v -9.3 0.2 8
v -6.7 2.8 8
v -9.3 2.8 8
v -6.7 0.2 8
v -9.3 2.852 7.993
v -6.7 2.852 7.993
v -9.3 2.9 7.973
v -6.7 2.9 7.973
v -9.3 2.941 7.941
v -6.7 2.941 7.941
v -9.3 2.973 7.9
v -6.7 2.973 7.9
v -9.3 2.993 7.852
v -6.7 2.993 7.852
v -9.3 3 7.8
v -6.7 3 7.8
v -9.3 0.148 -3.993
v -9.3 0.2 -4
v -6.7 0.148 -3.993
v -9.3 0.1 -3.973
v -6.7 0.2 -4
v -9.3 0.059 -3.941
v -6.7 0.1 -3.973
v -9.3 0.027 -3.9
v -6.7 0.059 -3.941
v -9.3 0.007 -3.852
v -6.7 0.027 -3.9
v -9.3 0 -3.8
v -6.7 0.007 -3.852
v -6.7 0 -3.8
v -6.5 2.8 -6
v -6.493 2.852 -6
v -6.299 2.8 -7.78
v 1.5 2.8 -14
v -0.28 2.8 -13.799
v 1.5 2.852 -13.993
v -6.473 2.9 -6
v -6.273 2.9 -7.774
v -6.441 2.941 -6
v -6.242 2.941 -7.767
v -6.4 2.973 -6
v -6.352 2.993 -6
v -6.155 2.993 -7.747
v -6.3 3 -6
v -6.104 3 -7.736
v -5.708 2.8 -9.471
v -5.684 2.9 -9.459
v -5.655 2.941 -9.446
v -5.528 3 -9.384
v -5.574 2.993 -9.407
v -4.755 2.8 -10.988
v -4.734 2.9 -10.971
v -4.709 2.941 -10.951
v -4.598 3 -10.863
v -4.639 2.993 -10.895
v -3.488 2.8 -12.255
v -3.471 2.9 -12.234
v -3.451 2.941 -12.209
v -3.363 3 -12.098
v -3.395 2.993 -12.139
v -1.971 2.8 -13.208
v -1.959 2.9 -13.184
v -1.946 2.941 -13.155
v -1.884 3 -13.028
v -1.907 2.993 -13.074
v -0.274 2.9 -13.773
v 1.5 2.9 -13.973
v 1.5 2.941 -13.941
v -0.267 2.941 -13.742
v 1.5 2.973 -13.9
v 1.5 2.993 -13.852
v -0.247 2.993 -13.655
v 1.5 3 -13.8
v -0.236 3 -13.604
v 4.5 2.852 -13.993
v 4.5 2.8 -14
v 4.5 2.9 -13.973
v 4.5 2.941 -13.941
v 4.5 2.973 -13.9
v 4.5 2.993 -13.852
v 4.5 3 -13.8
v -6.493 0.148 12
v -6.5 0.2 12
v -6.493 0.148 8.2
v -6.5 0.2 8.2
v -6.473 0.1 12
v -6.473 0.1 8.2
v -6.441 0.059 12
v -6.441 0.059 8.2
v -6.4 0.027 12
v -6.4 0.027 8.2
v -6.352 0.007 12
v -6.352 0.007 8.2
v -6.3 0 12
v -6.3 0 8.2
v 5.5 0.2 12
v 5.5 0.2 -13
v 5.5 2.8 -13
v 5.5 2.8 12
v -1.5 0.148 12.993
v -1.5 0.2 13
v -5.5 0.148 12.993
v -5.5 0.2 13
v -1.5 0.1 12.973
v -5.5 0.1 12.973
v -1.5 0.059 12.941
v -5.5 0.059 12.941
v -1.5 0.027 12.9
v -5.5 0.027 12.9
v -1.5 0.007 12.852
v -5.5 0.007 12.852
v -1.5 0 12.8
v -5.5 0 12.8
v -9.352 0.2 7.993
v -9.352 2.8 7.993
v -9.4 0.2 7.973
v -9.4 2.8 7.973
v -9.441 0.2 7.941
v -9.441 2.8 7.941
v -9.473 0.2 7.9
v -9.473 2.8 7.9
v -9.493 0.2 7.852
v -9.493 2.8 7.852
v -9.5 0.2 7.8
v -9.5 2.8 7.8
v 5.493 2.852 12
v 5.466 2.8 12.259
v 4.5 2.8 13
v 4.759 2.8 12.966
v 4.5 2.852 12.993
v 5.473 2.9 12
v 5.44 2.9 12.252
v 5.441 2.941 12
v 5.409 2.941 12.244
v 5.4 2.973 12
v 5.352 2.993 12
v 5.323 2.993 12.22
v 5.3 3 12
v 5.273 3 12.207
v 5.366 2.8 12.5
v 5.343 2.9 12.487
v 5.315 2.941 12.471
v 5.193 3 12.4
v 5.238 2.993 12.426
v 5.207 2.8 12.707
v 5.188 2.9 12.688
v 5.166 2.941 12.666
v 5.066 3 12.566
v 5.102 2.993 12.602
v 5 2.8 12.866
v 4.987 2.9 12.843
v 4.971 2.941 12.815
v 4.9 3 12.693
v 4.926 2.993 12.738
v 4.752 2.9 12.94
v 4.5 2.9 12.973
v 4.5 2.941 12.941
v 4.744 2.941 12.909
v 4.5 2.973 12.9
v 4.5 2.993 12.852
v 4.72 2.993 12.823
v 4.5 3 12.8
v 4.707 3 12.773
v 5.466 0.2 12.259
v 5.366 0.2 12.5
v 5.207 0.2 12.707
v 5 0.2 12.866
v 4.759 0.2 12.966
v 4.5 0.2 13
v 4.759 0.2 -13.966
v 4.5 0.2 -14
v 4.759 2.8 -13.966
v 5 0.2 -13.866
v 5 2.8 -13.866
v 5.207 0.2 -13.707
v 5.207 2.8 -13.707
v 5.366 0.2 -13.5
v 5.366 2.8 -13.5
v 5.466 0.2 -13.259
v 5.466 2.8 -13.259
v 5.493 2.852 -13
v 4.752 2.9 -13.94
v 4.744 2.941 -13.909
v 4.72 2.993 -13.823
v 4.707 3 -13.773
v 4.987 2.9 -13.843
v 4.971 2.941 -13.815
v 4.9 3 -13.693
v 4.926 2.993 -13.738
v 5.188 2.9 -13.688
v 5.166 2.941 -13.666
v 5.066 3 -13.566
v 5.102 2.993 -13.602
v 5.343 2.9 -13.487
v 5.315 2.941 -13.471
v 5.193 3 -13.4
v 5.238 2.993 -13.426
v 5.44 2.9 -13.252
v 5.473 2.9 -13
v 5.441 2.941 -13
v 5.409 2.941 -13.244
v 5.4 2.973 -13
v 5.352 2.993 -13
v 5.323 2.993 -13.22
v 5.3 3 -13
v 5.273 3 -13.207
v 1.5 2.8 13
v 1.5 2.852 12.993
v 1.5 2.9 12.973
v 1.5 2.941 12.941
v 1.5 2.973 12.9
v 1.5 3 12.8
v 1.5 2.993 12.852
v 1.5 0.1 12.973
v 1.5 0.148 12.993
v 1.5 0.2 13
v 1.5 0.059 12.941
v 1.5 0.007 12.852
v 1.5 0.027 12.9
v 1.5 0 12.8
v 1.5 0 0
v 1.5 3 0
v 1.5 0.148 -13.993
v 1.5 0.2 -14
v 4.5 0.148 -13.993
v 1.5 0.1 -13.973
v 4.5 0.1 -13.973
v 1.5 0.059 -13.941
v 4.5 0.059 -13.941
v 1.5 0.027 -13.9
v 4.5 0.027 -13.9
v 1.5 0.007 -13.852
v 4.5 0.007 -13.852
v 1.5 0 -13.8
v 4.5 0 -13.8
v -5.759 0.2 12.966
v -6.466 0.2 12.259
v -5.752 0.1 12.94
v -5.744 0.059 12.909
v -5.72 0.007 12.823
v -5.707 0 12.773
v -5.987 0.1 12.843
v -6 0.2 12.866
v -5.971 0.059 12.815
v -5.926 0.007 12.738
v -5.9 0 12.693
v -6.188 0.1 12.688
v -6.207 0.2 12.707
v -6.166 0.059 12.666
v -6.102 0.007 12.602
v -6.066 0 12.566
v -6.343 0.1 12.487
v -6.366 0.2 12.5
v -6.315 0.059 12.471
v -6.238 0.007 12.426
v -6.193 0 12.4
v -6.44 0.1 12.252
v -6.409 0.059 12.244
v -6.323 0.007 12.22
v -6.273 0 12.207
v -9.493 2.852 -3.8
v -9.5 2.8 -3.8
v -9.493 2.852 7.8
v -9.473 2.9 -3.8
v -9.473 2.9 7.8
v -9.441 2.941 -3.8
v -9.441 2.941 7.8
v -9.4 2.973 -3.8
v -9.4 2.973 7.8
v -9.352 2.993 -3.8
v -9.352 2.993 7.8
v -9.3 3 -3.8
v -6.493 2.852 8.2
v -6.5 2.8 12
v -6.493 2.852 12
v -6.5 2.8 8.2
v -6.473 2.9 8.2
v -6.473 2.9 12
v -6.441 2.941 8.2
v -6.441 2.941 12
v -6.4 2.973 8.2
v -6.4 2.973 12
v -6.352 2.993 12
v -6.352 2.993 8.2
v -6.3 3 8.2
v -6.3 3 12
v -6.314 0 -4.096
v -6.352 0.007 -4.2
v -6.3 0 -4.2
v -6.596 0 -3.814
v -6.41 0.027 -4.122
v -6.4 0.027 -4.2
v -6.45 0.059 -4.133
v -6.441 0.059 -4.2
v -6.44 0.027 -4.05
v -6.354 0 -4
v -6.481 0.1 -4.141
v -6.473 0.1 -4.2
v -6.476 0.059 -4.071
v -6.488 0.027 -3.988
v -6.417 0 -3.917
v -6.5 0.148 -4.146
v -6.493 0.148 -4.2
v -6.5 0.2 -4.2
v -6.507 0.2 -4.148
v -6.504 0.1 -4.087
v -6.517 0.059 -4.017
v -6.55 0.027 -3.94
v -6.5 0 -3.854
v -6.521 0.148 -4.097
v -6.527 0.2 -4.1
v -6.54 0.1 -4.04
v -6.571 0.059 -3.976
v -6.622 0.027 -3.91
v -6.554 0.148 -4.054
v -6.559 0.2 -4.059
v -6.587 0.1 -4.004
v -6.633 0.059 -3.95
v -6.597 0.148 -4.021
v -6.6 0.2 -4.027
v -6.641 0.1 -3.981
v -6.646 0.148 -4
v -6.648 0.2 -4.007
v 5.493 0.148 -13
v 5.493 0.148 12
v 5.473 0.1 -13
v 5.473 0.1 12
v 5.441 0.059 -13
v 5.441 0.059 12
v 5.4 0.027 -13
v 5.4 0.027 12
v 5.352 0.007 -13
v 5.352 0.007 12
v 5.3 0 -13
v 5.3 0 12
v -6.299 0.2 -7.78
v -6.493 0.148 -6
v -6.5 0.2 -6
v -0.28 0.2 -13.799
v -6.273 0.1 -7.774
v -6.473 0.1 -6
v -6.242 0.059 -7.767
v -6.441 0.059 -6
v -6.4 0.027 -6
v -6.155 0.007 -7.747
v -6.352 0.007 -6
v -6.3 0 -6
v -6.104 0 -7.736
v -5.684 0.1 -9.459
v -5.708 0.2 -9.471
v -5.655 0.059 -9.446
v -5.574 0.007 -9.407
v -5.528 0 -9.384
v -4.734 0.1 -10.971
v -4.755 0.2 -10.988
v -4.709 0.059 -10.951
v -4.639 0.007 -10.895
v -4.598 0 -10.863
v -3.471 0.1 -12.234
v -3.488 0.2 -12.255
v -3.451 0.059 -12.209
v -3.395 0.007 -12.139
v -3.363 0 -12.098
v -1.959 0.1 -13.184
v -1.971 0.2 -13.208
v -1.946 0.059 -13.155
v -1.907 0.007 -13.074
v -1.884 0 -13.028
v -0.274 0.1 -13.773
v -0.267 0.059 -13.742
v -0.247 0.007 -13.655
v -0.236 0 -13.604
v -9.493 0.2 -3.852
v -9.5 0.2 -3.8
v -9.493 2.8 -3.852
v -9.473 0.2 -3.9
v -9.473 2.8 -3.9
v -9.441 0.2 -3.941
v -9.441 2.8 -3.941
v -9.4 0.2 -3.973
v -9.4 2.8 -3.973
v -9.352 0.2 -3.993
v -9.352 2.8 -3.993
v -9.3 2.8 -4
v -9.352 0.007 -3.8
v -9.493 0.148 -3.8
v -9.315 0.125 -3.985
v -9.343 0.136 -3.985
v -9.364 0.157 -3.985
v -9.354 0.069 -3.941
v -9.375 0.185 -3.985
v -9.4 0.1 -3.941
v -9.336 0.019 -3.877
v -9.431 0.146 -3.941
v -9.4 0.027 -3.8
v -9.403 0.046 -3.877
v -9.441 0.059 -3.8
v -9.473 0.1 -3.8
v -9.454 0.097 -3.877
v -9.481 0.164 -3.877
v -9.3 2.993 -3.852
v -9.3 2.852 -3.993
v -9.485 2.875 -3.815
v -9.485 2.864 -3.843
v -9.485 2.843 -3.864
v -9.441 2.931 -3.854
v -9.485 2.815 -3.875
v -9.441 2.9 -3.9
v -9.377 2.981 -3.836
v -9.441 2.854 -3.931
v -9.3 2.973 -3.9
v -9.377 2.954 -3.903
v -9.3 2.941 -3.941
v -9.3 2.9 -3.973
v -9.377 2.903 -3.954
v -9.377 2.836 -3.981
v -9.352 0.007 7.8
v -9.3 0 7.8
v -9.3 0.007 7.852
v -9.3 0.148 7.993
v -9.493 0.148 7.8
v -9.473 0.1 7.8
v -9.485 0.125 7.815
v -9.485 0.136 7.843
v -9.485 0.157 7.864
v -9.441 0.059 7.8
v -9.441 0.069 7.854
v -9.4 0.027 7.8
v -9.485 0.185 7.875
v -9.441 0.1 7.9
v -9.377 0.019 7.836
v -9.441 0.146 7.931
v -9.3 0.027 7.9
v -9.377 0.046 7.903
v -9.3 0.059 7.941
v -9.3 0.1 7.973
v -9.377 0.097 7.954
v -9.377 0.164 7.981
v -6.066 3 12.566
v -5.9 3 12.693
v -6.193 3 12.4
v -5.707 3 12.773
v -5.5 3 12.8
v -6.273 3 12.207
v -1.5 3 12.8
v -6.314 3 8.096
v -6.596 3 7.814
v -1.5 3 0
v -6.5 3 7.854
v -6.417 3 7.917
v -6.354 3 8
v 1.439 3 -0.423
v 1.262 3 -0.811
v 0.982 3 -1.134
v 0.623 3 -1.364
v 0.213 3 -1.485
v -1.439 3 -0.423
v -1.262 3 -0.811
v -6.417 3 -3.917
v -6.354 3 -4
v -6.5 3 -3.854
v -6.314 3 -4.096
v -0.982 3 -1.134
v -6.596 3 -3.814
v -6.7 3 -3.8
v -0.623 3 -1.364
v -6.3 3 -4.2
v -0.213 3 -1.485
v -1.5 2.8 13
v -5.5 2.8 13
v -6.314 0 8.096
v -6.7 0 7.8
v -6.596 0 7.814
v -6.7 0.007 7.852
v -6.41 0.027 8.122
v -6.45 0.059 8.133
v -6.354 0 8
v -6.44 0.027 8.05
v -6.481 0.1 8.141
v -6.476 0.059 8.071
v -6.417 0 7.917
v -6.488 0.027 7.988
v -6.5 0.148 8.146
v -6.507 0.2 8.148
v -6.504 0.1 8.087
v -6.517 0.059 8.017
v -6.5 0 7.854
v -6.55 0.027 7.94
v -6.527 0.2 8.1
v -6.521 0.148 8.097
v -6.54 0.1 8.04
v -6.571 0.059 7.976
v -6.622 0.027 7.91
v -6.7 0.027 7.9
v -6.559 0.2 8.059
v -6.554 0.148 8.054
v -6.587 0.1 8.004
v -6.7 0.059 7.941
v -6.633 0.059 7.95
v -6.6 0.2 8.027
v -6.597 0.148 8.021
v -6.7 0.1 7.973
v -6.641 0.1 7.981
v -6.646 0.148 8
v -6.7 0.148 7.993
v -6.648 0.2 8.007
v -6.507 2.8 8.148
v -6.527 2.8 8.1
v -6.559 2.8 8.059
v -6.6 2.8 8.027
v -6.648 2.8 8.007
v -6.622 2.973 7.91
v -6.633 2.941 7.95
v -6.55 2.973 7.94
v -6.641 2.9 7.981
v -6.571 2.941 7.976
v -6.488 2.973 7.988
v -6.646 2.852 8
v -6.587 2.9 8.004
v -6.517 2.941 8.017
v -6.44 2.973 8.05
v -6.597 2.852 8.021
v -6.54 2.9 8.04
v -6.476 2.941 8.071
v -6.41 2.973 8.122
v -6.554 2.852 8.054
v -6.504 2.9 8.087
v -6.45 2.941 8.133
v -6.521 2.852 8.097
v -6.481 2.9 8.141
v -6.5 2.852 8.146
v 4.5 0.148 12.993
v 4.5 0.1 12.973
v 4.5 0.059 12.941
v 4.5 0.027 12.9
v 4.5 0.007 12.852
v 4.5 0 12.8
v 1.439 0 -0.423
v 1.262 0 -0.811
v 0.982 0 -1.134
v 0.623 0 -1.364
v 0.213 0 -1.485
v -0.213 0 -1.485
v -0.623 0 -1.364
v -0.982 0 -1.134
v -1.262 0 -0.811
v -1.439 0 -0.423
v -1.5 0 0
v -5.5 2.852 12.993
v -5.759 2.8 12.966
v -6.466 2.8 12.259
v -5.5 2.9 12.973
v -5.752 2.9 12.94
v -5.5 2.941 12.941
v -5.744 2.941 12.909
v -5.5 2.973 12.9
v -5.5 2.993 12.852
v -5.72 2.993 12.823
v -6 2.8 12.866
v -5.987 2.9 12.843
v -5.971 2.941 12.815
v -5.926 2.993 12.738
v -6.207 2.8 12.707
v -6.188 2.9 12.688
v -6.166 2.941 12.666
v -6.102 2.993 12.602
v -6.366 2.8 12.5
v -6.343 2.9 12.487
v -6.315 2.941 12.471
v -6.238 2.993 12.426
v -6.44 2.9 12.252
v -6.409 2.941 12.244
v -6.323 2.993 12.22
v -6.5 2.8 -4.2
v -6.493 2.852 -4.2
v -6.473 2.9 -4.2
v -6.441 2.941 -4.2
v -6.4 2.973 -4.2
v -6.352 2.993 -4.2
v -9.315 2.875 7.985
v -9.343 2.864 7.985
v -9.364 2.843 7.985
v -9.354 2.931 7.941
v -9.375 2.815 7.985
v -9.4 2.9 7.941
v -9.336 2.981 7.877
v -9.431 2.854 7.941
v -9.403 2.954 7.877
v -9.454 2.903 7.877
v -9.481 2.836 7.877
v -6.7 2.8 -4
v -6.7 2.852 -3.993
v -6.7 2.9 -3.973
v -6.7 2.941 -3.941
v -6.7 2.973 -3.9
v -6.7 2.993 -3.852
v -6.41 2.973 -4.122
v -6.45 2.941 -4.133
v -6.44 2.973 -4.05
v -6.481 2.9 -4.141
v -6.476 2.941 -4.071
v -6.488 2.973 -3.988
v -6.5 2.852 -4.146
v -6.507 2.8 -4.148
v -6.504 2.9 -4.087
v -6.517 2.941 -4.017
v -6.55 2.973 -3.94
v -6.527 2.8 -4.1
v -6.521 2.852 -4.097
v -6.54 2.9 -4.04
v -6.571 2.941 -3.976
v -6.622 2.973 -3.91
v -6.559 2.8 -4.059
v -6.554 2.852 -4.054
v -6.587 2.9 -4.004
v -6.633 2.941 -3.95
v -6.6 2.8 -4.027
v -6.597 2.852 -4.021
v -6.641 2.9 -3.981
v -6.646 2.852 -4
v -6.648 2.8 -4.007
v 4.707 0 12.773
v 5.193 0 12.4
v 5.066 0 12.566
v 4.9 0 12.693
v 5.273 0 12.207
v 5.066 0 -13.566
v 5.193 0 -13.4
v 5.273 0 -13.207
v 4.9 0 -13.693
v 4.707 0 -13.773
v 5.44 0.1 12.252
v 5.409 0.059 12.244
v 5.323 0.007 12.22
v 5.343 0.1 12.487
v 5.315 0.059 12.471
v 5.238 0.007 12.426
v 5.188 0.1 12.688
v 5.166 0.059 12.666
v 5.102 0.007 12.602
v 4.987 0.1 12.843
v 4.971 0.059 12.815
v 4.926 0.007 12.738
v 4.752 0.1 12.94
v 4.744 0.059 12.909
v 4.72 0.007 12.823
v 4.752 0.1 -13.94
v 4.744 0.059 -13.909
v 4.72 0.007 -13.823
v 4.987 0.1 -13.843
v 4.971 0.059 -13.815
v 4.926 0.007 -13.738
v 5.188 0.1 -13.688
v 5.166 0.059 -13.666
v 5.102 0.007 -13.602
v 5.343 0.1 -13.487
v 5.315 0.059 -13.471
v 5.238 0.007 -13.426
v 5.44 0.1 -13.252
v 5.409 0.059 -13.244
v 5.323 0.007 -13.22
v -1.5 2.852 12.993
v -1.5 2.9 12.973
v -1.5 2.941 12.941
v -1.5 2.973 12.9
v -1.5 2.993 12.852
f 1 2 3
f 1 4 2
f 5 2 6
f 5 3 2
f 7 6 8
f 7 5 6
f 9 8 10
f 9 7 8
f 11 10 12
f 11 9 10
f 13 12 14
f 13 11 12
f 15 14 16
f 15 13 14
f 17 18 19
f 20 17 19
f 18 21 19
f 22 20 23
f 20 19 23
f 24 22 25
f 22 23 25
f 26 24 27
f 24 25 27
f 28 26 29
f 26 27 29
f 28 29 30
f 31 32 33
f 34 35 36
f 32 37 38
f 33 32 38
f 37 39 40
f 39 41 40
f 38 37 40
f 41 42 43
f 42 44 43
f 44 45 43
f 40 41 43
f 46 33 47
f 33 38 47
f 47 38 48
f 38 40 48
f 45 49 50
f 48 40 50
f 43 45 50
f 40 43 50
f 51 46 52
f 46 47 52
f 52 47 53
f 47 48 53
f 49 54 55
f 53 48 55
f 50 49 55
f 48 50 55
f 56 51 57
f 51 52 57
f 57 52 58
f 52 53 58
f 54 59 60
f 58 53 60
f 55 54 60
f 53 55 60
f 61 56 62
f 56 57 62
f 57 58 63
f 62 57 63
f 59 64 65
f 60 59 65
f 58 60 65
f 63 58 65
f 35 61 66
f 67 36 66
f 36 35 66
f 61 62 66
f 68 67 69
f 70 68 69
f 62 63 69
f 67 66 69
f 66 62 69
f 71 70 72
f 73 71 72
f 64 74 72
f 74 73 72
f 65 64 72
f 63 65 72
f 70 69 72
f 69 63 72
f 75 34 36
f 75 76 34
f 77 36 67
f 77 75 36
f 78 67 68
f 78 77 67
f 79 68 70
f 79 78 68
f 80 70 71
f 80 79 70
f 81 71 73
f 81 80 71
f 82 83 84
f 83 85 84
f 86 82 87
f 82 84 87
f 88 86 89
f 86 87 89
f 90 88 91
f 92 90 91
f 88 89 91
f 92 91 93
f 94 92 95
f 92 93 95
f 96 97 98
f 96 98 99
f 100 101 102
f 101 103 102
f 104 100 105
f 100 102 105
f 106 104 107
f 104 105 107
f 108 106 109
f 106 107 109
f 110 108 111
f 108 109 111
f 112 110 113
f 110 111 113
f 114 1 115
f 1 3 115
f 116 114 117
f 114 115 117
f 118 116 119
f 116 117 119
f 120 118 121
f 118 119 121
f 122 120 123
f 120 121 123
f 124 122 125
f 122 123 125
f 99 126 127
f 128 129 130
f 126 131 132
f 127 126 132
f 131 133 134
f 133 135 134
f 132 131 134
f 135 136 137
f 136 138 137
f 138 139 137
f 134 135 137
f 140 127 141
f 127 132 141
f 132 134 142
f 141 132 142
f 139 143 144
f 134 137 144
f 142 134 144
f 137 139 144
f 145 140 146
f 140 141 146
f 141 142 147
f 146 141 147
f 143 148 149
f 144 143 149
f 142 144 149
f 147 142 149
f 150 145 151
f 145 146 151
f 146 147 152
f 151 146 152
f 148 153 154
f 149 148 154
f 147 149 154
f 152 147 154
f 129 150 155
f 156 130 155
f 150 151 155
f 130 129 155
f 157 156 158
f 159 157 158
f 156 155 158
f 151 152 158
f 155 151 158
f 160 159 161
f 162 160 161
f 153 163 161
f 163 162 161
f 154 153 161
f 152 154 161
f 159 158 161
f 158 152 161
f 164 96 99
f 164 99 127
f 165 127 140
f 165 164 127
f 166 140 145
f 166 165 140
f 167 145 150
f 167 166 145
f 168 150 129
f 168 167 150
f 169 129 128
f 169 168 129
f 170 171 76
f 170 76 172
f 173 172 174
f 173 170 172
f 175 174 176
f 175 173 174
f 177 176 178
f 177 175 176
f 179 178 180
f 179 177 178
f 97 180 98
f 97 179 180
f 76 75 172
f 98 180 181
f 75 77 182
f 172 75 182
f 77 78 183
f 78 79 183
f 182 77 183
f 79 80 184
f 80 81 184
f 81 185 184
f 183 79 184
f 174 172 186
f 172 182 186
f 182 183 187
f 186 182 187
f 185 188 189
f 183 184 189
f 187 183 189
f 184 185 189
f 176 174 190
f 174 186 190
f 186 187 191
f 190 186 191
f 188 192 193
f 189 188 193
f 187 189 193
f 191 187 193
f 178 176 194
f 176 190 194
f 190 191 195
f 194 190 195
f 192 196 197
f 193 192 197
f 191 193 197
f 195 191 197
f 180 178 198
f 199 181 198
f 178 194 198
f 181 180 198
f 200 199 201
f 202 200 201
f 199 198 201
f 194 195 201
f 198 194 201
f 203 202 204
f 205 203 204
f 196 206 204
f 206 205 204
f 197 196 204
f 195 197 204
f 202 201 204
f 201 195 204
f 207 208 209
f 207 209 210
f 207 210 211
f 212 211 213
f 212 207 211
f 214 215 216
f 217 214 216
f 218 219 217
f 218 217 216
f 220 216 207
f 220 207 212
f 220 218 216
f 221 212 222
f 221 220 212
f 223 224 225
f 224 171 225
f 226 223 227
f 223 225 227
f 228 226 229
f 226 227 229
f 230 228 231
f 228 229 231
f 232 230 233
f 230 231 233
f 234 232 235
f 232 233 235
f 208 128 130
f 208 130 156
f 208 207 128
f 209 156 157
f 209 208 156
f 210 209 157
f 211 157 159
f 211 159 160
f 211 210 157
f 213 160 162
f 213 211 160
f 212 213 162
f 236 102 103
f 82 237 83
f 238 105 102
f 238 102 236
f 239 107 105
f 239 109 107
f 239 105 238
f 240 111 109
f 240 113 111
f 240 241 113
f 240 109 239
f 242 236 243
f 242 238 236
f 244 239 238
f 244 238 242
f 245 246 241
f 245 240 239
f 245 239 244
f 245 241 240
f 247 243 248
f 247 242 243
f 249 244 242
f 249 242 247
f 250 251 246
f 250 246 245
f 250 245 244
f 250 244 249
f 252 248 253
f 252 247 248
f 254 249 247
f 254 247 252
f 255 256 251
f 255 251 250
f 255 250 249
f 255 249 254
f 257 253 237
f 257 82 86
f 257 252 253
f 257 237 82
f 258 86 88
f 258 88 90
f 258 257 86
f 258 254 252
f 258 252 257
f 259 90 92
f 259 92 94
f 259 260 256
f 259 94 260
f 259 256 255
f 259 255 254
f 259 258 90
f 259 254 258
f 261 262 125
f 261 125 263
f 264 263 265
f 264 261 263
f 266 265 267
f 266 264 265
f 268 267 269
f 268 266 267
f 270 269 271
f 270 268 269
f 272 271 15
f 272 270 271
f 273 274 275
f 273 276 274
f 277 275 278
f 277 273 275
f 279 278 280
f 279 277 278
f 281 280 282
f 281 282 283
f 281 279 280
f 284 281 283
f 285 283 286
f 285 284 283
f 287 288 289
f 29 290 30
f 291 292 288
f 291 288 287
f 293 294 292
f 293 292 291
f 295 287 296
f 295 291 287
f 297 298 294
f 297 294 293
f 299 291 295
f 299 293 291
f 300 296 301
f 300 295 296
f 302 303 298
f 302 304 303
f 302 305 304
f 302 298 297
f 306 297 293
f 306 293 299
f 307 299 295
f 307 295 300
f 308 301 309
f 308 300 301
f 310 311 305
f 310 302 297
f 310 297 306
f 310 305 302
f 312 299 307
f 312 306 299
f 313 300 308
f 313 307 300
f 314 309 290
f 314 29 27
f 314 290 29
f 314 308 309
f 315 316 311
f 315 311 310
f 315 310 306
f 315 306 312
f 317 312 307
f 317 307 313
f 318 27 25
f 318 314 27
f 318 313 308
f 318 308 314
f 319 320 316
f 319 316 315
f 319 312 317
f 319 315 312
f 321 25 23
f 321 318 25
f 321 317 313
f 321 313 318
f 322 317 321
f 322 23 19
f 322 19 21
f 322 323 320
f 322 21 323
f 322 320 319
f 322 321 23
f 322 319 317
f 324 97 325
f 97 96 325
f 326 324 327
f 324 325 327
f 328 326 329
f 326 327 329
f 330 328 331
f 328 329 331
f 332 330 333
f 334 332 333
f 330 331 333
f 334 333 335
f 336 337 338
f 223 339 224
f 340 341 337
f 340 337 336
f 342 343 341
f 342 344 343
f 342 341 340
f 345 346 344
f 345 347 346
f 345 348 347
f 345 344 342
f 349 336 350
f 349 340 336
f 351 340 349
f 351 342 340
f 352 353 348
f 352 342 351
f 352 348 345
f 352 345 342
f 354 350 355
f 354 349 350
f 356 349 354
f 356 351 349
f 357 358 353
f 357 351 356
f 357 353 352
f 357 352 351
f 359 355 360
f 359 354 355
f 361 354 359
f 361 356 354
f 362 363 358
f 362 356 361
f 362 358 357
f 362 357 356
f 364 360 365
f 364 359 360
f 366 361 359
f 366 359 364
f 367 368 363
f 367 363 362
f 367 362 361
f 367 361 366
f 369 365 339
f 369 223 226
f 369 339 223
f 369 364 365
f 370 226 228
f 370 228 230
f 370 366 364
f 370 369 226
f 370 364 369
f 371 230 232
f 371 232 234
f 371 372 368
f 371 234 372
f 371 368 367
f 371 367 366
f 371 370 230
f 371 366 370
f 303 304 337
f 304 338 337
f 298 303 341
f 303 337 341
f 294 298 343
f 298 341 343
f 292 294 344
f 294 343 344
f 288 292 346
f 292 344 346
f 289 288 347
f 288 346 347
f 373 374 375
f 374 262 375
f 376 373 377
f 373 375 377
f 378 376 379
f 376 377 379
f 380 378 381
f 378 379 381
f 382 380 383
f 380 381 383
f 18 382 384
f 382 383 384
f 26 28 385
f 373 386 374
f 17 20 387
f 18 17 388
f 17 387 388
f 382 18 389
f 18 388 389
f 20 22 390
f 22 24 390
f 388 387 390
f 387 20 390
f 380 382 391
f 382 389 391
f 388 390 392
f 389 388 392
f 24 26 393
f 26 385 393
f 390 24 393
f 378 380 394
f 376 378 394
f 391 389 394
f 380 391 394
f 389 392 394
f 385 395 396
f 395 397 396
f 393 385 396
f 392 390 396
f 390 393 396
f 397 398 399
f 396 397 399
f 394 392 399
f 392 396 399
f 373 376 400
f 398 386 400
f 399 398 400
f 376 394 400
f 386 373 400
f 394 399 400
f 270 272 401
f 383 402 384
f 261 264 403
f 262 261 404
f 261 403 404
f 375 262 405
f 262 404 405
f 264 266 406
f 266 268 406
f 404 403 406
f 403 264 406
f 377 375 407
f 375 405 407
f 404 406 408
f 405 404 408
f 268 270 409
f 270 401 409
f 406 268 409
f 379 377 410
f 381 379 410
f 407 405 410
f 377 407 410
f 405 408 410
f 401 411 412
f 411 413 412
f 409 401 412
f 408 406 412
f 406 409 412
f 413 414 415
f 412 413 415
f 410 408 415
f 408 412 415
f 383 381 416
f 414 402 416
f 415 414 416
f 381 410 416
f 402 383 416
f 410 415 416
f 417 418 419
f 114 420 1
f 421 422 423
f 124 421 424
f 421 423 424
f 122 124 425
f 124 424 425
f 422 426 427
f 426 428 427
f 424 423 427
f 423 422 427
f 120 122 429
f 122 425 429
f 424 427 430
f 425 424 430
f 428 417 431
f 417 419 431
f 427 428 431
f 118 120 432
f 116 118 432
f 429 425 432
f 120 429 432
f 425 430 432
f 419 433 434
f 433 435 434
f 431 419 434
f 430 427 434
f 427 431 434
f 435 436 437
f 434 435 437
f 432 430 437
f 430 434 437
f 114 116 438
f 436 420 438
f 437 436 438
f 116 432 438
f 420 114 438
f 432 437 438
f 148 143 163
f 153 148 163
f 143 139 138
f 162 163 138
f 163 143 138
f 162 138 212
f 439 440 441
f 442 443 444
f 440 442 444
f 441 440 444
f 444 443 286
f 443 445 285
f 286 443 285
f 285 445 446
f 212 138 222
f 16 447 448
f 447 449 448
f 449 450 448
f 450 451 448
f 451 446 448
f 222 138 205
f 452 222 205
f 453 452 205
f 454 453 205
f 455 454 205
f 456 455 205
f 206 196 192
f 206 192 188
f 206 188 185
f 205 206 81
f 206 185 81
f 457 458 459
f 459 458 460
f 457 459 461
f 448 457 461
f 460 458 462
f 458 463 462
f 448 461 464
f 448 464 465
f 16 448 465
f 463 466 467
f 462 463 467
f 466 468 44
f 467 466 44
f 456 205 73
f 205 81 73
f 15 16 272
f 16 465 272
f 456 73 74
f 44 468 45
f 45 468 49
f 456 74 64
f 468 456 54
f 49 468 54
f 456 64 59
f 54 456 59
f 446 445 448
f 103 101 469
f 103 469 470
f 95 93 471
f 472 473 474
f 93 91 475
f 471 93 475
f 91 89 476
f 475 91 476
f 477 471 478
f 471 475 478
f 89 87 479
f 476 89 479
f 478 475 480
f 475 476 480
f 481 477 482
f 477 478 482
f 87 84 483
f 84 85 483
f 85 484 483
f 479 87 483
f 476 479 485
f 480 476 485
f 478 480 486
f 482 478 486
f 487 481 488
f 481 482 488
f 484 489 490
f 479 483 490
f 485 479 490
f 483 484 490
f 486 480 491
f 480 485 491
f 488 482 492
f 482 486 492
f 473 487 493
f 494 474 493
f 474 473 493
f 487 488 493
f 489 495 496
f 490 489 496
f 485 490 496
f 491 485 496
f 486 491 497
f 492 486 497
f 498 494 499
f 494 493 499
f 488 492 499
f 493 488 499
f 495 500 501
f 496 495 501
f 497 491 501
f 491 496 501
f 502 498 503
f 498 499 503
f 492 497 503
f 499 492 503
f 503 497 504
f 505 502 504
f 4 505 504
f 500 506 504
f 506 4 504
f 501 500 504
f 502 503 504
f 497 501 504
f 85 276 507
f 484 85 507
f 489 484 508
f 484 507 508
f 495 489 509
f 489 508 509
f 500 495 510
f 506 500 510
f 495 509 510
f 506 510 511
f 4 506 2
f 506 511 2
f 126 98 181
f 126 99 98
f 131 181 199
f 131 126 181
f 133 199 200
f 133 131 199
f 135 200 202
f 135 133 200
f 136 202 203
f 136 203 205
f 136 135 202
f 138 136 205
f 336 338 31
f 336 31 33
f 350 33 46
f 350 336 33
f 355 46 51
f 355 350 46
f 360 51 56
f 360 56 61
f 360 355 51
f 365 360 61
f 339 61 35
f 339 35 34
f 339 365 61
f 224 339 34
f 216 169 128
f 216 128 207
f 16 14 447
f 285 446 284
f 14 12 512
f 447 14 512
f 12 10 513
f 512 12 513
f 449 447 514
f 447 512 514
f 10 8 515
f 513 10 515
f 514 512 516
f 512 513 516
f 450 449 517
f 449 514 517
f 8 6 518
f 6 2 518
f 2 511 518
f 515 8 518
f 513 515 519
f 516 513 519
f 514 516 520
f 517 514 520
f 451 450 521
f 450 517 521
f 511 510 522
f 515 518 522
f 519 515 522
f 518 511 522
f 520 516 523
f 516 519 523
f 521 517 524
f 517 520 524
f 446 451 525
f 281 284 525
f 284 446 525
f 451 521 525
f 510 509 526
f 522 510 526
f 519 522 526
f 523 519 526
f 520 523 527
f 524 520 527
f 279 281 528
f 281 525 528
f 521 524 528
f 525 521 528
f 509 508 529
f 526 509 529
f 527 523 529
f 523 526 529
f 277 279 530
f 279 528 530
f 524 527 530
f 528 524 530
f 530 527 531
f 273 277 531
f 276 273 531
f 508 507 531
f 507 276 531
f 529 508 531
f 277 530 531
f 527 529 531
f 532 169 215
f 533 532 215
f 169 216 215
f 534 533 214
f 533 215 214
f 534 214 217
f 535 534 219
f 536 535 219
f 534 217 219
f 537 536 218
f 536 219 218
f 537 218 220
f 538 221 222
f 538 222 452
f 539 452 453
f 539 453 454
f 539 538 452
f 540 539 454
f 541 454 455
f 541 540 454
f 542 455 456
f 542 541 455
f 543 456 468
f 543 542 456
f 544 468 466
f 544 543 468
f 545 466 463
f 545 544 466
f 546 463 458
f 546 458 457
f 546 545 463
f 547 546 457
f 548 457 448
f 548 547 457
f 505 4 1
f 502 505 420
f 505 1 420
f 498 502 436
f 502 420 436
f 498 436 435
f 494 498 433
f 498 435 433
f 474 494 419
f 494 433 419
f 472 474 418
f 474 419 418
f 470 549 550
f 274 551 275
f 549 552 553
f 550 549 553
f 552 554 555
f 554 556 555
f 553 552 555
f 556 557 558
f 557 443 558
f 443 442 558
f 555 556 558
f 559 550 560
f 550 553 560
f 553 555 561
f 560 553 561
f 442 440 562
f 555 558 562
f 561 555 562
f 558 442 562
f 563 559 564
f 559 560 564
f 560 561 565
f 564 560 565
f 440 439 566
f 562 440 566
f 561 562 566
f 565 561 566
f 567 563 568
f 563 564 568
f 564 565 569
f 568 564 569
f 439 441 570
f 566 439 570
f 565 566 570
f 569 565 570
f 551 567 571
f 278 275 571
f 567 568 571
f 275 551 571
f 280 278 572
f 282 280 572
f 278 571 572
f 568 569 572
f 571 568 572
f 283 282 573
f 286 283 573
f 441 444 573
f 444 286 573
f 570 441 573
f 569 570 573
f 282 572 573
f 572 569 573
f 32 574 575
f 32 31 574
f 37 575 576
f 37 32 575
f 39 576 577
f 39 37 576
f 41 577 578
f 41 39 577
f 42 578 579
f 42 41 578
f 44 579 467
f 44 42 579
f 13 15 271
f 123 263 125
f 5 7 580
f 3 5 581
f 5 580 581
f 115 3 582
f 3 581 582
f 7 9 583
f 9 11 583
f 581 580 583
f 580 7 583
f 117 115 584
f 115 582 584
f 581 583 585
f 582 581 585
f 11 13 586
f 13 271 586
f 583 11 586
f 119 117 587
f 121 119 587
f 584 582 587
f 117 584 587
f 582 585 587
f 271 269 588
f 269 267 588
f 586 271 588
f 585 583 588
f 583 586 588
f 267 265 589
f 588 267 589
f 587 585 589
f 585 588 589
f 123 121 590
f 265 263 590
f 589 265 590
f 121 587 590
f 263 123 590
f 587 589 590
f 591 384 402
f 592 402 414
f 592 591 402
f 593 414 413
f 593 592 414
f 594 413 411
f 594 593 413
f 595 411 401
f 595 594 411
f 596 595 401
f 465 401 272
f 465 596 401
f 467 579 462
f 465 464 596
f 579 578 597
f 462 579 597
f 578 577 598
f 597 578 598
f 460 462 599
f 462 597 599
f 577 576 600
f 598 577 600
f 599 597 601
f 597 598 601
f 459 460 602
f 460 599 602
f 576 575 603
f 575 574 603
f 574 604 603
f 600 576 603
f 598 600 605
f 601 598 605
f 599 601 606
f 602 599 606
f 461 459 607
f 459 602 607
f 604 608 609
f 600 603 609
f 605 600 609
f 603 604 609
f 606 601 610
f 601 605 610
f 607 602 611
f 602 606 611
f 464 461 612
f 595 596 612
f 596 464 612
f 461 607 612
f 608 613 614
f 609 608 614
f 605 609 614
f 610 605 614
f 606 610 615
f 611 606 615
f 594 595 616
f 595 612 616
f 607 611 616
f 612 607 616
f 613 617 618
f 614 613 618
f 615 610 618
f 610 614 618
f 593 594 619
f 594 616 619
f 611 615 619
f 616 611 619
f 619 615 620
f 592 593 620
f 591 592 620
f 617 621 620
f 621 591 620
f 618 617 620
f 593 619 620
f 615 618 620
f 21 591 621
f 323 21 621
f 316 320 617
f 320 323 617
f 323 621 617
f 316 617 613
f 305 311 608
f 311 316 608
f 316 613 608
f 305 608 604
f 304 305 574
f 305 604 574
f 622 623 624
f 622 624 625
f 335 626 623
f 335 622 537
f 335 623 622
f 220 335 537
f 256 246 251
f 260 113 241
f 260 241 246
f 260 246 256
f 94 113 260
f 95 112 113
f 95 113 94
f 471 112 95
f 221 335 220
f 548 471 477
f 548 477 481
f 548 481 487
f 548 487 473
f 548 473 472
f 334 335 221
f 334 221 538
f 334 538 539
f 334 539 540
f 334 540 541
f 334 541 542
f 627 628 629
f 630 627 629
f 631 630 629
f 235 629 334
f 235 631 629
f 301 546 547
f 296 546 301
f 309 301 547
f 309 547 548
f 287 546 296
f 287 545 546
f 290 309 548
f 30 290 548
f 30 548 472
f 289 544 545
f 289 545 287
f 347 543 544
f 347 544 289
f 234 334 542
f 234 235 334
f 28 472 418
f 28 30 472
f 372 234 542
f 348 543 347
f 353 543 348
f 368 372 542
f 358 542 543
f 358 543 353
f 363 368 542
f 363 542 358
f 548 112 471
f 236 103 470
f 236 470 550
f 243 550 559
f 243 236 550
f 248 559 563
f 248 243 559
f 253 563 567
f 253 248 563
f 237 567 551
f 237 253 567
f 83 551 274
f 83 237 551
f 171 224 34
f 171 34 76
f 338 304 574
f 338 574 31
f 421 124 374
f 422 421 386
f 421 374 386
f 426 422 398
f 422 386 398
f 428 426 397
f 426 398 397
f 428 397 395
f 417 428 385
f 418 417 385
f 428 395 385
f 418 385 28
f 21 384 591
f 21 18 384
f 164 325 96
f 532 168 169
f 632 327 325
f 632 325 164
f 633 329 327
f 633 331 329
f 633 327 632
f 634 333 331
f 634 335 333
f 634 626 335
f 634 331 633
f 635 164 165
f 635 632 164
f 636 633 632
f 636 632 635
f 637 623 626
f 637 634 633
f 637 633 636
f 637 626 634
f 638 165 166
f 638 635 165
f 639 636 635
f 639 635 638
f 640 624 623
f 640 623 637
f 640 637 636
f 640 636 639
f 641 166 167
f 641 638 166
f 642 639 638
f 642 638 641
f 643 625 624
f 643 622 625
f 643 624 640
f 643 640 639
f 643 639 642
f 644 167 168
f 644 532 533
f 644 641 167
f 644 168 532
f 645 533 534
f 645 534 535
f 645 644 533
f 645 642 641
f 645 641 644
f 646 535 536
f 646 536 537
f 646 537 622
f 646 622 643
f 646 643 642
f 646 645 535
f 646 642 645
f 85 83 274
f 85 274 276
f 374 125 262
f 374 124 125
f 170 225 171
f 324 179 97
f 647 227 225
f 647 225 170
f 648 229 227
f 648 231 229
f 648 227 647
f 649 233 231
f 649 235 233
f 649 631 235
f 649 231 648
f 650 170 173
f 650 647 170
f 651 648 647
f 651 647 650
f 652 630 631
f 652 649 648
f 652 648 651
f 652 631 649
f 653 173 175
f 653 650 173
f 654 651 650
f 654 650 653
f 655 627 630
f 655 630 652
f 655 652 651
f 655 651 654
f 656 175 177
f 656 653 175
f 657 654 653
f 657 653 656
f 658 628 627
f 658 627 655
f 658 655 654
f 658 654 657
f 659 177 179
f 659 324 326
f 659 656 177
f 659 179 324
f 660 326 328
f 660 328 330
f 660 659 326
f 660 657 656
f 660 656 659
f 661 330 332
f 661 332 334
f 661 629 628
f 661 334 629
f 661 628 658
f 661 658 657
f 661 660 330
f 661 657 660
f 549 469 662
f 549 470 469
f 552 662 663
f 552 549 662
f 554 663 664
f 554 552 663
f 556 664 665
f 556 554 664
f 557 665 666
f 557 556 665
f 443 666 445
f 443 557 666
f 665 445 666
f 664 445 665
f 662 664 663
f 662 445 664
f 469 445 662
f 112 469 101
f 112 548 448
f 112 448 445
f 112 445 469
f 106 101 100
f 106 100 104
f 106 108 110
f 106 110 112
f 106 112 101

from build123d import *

# Parameters (mm, degrees)
BOSS_EXTRUDE1_DEPTH = 3
FILLET1_R           = 0.2


with BuildPart() as part:
    # Sketch1 → Boss-Extrude1 (new body)
    with BuildSketch(Plane(origin=(0, 0, 0), x_dir=(1, 0, 0), z_dir=(0, 1, 0))):
        with BuildLine():
            Line((-1.5, 0), (-1.5, -13))
            Line((-1.5, -13), (-5.5, -13))
            ThreePointArc((-5.5, -13), (-6.207106781, -12.707106781), (-6.5, -12))
            Line((-6.5, -12), (-6.5, -8))
            Line((-6.5, -8), (-9.5, -8))
            Line((-9.5, -8), (-9.5, 4))
            Line((-9.5, 4), (-6.5, 4))
            Line((-6.5, 4), (-6.5, 6))
            ThreePointArc((-6.5, 6), (-4.156854249, 11.656854249), (1.5, 14))
            Line((1.5, 14), (4.5, 14))
            ThreePointArc((4.5, 14), (5.207106781, 13.707106781), (5.5, 13))
            Line((5.5, 13), (5.5, -12))
            ThreePointArc((5.5, -12), (5.207106781, -12.707106781), (4.5, -13))
            Line((4.5, -13), (1.5, -13))
            Line((1.5, -13), (1.5, 0))
            ThreePointArc((1.5, 0), (0, 1.5), (-1.5, 0))
        make_face()
    extrude(amount=BOSS_EXTRUDE1_DEPTH)

    # Fillet1
    fillet1_edges = [part.edges().sort_by_distance(p)[0] for p in [
        (-8, 3, -4),
        (-9.5, 3, 2),
        (3, 0, -14),
        (5.207106781, 0, -13.707106781),
        (5.5, 0, -0.5),
        (5.207106781, 0, 12.707106781),
        (3, 0, 13),
        (-8, 3, 8),
        (-3.5, 0, 13),
        (-6.207106781, 0, 12.707106781),
        (-6.5, 0, 10),
        (-8, 0, 8),
        (-9.5, 0, 2),
        (-6.5, 3, 10),
        (-8, 0, -4),
        (-6.5, 0, -5),
        (-4.156854249, 0, -11.656854249),
        (-6.207106781, 3, 12.707106781),
        (-3.5, 3, 13),
        (-6.5, 1.5, 8),
        (-9.5, 1.5, 8),
        (-9.5, 1.5, -4),
        (-6.5, 1.5, -4),
        (3, 3, 13),
        (-4.156854249, 3, -11.656854249),
        (5.207106781, 3, 12.707106781),
        (5.5, 3, -0.5),
        (5.207106781, 3, -13.707106781),
        (3, 3, -14),
        (-6.5, 3, -5),
    ]]
    fillet(fillet1_edges, radius=FILLET1_R)


solid = part.part
